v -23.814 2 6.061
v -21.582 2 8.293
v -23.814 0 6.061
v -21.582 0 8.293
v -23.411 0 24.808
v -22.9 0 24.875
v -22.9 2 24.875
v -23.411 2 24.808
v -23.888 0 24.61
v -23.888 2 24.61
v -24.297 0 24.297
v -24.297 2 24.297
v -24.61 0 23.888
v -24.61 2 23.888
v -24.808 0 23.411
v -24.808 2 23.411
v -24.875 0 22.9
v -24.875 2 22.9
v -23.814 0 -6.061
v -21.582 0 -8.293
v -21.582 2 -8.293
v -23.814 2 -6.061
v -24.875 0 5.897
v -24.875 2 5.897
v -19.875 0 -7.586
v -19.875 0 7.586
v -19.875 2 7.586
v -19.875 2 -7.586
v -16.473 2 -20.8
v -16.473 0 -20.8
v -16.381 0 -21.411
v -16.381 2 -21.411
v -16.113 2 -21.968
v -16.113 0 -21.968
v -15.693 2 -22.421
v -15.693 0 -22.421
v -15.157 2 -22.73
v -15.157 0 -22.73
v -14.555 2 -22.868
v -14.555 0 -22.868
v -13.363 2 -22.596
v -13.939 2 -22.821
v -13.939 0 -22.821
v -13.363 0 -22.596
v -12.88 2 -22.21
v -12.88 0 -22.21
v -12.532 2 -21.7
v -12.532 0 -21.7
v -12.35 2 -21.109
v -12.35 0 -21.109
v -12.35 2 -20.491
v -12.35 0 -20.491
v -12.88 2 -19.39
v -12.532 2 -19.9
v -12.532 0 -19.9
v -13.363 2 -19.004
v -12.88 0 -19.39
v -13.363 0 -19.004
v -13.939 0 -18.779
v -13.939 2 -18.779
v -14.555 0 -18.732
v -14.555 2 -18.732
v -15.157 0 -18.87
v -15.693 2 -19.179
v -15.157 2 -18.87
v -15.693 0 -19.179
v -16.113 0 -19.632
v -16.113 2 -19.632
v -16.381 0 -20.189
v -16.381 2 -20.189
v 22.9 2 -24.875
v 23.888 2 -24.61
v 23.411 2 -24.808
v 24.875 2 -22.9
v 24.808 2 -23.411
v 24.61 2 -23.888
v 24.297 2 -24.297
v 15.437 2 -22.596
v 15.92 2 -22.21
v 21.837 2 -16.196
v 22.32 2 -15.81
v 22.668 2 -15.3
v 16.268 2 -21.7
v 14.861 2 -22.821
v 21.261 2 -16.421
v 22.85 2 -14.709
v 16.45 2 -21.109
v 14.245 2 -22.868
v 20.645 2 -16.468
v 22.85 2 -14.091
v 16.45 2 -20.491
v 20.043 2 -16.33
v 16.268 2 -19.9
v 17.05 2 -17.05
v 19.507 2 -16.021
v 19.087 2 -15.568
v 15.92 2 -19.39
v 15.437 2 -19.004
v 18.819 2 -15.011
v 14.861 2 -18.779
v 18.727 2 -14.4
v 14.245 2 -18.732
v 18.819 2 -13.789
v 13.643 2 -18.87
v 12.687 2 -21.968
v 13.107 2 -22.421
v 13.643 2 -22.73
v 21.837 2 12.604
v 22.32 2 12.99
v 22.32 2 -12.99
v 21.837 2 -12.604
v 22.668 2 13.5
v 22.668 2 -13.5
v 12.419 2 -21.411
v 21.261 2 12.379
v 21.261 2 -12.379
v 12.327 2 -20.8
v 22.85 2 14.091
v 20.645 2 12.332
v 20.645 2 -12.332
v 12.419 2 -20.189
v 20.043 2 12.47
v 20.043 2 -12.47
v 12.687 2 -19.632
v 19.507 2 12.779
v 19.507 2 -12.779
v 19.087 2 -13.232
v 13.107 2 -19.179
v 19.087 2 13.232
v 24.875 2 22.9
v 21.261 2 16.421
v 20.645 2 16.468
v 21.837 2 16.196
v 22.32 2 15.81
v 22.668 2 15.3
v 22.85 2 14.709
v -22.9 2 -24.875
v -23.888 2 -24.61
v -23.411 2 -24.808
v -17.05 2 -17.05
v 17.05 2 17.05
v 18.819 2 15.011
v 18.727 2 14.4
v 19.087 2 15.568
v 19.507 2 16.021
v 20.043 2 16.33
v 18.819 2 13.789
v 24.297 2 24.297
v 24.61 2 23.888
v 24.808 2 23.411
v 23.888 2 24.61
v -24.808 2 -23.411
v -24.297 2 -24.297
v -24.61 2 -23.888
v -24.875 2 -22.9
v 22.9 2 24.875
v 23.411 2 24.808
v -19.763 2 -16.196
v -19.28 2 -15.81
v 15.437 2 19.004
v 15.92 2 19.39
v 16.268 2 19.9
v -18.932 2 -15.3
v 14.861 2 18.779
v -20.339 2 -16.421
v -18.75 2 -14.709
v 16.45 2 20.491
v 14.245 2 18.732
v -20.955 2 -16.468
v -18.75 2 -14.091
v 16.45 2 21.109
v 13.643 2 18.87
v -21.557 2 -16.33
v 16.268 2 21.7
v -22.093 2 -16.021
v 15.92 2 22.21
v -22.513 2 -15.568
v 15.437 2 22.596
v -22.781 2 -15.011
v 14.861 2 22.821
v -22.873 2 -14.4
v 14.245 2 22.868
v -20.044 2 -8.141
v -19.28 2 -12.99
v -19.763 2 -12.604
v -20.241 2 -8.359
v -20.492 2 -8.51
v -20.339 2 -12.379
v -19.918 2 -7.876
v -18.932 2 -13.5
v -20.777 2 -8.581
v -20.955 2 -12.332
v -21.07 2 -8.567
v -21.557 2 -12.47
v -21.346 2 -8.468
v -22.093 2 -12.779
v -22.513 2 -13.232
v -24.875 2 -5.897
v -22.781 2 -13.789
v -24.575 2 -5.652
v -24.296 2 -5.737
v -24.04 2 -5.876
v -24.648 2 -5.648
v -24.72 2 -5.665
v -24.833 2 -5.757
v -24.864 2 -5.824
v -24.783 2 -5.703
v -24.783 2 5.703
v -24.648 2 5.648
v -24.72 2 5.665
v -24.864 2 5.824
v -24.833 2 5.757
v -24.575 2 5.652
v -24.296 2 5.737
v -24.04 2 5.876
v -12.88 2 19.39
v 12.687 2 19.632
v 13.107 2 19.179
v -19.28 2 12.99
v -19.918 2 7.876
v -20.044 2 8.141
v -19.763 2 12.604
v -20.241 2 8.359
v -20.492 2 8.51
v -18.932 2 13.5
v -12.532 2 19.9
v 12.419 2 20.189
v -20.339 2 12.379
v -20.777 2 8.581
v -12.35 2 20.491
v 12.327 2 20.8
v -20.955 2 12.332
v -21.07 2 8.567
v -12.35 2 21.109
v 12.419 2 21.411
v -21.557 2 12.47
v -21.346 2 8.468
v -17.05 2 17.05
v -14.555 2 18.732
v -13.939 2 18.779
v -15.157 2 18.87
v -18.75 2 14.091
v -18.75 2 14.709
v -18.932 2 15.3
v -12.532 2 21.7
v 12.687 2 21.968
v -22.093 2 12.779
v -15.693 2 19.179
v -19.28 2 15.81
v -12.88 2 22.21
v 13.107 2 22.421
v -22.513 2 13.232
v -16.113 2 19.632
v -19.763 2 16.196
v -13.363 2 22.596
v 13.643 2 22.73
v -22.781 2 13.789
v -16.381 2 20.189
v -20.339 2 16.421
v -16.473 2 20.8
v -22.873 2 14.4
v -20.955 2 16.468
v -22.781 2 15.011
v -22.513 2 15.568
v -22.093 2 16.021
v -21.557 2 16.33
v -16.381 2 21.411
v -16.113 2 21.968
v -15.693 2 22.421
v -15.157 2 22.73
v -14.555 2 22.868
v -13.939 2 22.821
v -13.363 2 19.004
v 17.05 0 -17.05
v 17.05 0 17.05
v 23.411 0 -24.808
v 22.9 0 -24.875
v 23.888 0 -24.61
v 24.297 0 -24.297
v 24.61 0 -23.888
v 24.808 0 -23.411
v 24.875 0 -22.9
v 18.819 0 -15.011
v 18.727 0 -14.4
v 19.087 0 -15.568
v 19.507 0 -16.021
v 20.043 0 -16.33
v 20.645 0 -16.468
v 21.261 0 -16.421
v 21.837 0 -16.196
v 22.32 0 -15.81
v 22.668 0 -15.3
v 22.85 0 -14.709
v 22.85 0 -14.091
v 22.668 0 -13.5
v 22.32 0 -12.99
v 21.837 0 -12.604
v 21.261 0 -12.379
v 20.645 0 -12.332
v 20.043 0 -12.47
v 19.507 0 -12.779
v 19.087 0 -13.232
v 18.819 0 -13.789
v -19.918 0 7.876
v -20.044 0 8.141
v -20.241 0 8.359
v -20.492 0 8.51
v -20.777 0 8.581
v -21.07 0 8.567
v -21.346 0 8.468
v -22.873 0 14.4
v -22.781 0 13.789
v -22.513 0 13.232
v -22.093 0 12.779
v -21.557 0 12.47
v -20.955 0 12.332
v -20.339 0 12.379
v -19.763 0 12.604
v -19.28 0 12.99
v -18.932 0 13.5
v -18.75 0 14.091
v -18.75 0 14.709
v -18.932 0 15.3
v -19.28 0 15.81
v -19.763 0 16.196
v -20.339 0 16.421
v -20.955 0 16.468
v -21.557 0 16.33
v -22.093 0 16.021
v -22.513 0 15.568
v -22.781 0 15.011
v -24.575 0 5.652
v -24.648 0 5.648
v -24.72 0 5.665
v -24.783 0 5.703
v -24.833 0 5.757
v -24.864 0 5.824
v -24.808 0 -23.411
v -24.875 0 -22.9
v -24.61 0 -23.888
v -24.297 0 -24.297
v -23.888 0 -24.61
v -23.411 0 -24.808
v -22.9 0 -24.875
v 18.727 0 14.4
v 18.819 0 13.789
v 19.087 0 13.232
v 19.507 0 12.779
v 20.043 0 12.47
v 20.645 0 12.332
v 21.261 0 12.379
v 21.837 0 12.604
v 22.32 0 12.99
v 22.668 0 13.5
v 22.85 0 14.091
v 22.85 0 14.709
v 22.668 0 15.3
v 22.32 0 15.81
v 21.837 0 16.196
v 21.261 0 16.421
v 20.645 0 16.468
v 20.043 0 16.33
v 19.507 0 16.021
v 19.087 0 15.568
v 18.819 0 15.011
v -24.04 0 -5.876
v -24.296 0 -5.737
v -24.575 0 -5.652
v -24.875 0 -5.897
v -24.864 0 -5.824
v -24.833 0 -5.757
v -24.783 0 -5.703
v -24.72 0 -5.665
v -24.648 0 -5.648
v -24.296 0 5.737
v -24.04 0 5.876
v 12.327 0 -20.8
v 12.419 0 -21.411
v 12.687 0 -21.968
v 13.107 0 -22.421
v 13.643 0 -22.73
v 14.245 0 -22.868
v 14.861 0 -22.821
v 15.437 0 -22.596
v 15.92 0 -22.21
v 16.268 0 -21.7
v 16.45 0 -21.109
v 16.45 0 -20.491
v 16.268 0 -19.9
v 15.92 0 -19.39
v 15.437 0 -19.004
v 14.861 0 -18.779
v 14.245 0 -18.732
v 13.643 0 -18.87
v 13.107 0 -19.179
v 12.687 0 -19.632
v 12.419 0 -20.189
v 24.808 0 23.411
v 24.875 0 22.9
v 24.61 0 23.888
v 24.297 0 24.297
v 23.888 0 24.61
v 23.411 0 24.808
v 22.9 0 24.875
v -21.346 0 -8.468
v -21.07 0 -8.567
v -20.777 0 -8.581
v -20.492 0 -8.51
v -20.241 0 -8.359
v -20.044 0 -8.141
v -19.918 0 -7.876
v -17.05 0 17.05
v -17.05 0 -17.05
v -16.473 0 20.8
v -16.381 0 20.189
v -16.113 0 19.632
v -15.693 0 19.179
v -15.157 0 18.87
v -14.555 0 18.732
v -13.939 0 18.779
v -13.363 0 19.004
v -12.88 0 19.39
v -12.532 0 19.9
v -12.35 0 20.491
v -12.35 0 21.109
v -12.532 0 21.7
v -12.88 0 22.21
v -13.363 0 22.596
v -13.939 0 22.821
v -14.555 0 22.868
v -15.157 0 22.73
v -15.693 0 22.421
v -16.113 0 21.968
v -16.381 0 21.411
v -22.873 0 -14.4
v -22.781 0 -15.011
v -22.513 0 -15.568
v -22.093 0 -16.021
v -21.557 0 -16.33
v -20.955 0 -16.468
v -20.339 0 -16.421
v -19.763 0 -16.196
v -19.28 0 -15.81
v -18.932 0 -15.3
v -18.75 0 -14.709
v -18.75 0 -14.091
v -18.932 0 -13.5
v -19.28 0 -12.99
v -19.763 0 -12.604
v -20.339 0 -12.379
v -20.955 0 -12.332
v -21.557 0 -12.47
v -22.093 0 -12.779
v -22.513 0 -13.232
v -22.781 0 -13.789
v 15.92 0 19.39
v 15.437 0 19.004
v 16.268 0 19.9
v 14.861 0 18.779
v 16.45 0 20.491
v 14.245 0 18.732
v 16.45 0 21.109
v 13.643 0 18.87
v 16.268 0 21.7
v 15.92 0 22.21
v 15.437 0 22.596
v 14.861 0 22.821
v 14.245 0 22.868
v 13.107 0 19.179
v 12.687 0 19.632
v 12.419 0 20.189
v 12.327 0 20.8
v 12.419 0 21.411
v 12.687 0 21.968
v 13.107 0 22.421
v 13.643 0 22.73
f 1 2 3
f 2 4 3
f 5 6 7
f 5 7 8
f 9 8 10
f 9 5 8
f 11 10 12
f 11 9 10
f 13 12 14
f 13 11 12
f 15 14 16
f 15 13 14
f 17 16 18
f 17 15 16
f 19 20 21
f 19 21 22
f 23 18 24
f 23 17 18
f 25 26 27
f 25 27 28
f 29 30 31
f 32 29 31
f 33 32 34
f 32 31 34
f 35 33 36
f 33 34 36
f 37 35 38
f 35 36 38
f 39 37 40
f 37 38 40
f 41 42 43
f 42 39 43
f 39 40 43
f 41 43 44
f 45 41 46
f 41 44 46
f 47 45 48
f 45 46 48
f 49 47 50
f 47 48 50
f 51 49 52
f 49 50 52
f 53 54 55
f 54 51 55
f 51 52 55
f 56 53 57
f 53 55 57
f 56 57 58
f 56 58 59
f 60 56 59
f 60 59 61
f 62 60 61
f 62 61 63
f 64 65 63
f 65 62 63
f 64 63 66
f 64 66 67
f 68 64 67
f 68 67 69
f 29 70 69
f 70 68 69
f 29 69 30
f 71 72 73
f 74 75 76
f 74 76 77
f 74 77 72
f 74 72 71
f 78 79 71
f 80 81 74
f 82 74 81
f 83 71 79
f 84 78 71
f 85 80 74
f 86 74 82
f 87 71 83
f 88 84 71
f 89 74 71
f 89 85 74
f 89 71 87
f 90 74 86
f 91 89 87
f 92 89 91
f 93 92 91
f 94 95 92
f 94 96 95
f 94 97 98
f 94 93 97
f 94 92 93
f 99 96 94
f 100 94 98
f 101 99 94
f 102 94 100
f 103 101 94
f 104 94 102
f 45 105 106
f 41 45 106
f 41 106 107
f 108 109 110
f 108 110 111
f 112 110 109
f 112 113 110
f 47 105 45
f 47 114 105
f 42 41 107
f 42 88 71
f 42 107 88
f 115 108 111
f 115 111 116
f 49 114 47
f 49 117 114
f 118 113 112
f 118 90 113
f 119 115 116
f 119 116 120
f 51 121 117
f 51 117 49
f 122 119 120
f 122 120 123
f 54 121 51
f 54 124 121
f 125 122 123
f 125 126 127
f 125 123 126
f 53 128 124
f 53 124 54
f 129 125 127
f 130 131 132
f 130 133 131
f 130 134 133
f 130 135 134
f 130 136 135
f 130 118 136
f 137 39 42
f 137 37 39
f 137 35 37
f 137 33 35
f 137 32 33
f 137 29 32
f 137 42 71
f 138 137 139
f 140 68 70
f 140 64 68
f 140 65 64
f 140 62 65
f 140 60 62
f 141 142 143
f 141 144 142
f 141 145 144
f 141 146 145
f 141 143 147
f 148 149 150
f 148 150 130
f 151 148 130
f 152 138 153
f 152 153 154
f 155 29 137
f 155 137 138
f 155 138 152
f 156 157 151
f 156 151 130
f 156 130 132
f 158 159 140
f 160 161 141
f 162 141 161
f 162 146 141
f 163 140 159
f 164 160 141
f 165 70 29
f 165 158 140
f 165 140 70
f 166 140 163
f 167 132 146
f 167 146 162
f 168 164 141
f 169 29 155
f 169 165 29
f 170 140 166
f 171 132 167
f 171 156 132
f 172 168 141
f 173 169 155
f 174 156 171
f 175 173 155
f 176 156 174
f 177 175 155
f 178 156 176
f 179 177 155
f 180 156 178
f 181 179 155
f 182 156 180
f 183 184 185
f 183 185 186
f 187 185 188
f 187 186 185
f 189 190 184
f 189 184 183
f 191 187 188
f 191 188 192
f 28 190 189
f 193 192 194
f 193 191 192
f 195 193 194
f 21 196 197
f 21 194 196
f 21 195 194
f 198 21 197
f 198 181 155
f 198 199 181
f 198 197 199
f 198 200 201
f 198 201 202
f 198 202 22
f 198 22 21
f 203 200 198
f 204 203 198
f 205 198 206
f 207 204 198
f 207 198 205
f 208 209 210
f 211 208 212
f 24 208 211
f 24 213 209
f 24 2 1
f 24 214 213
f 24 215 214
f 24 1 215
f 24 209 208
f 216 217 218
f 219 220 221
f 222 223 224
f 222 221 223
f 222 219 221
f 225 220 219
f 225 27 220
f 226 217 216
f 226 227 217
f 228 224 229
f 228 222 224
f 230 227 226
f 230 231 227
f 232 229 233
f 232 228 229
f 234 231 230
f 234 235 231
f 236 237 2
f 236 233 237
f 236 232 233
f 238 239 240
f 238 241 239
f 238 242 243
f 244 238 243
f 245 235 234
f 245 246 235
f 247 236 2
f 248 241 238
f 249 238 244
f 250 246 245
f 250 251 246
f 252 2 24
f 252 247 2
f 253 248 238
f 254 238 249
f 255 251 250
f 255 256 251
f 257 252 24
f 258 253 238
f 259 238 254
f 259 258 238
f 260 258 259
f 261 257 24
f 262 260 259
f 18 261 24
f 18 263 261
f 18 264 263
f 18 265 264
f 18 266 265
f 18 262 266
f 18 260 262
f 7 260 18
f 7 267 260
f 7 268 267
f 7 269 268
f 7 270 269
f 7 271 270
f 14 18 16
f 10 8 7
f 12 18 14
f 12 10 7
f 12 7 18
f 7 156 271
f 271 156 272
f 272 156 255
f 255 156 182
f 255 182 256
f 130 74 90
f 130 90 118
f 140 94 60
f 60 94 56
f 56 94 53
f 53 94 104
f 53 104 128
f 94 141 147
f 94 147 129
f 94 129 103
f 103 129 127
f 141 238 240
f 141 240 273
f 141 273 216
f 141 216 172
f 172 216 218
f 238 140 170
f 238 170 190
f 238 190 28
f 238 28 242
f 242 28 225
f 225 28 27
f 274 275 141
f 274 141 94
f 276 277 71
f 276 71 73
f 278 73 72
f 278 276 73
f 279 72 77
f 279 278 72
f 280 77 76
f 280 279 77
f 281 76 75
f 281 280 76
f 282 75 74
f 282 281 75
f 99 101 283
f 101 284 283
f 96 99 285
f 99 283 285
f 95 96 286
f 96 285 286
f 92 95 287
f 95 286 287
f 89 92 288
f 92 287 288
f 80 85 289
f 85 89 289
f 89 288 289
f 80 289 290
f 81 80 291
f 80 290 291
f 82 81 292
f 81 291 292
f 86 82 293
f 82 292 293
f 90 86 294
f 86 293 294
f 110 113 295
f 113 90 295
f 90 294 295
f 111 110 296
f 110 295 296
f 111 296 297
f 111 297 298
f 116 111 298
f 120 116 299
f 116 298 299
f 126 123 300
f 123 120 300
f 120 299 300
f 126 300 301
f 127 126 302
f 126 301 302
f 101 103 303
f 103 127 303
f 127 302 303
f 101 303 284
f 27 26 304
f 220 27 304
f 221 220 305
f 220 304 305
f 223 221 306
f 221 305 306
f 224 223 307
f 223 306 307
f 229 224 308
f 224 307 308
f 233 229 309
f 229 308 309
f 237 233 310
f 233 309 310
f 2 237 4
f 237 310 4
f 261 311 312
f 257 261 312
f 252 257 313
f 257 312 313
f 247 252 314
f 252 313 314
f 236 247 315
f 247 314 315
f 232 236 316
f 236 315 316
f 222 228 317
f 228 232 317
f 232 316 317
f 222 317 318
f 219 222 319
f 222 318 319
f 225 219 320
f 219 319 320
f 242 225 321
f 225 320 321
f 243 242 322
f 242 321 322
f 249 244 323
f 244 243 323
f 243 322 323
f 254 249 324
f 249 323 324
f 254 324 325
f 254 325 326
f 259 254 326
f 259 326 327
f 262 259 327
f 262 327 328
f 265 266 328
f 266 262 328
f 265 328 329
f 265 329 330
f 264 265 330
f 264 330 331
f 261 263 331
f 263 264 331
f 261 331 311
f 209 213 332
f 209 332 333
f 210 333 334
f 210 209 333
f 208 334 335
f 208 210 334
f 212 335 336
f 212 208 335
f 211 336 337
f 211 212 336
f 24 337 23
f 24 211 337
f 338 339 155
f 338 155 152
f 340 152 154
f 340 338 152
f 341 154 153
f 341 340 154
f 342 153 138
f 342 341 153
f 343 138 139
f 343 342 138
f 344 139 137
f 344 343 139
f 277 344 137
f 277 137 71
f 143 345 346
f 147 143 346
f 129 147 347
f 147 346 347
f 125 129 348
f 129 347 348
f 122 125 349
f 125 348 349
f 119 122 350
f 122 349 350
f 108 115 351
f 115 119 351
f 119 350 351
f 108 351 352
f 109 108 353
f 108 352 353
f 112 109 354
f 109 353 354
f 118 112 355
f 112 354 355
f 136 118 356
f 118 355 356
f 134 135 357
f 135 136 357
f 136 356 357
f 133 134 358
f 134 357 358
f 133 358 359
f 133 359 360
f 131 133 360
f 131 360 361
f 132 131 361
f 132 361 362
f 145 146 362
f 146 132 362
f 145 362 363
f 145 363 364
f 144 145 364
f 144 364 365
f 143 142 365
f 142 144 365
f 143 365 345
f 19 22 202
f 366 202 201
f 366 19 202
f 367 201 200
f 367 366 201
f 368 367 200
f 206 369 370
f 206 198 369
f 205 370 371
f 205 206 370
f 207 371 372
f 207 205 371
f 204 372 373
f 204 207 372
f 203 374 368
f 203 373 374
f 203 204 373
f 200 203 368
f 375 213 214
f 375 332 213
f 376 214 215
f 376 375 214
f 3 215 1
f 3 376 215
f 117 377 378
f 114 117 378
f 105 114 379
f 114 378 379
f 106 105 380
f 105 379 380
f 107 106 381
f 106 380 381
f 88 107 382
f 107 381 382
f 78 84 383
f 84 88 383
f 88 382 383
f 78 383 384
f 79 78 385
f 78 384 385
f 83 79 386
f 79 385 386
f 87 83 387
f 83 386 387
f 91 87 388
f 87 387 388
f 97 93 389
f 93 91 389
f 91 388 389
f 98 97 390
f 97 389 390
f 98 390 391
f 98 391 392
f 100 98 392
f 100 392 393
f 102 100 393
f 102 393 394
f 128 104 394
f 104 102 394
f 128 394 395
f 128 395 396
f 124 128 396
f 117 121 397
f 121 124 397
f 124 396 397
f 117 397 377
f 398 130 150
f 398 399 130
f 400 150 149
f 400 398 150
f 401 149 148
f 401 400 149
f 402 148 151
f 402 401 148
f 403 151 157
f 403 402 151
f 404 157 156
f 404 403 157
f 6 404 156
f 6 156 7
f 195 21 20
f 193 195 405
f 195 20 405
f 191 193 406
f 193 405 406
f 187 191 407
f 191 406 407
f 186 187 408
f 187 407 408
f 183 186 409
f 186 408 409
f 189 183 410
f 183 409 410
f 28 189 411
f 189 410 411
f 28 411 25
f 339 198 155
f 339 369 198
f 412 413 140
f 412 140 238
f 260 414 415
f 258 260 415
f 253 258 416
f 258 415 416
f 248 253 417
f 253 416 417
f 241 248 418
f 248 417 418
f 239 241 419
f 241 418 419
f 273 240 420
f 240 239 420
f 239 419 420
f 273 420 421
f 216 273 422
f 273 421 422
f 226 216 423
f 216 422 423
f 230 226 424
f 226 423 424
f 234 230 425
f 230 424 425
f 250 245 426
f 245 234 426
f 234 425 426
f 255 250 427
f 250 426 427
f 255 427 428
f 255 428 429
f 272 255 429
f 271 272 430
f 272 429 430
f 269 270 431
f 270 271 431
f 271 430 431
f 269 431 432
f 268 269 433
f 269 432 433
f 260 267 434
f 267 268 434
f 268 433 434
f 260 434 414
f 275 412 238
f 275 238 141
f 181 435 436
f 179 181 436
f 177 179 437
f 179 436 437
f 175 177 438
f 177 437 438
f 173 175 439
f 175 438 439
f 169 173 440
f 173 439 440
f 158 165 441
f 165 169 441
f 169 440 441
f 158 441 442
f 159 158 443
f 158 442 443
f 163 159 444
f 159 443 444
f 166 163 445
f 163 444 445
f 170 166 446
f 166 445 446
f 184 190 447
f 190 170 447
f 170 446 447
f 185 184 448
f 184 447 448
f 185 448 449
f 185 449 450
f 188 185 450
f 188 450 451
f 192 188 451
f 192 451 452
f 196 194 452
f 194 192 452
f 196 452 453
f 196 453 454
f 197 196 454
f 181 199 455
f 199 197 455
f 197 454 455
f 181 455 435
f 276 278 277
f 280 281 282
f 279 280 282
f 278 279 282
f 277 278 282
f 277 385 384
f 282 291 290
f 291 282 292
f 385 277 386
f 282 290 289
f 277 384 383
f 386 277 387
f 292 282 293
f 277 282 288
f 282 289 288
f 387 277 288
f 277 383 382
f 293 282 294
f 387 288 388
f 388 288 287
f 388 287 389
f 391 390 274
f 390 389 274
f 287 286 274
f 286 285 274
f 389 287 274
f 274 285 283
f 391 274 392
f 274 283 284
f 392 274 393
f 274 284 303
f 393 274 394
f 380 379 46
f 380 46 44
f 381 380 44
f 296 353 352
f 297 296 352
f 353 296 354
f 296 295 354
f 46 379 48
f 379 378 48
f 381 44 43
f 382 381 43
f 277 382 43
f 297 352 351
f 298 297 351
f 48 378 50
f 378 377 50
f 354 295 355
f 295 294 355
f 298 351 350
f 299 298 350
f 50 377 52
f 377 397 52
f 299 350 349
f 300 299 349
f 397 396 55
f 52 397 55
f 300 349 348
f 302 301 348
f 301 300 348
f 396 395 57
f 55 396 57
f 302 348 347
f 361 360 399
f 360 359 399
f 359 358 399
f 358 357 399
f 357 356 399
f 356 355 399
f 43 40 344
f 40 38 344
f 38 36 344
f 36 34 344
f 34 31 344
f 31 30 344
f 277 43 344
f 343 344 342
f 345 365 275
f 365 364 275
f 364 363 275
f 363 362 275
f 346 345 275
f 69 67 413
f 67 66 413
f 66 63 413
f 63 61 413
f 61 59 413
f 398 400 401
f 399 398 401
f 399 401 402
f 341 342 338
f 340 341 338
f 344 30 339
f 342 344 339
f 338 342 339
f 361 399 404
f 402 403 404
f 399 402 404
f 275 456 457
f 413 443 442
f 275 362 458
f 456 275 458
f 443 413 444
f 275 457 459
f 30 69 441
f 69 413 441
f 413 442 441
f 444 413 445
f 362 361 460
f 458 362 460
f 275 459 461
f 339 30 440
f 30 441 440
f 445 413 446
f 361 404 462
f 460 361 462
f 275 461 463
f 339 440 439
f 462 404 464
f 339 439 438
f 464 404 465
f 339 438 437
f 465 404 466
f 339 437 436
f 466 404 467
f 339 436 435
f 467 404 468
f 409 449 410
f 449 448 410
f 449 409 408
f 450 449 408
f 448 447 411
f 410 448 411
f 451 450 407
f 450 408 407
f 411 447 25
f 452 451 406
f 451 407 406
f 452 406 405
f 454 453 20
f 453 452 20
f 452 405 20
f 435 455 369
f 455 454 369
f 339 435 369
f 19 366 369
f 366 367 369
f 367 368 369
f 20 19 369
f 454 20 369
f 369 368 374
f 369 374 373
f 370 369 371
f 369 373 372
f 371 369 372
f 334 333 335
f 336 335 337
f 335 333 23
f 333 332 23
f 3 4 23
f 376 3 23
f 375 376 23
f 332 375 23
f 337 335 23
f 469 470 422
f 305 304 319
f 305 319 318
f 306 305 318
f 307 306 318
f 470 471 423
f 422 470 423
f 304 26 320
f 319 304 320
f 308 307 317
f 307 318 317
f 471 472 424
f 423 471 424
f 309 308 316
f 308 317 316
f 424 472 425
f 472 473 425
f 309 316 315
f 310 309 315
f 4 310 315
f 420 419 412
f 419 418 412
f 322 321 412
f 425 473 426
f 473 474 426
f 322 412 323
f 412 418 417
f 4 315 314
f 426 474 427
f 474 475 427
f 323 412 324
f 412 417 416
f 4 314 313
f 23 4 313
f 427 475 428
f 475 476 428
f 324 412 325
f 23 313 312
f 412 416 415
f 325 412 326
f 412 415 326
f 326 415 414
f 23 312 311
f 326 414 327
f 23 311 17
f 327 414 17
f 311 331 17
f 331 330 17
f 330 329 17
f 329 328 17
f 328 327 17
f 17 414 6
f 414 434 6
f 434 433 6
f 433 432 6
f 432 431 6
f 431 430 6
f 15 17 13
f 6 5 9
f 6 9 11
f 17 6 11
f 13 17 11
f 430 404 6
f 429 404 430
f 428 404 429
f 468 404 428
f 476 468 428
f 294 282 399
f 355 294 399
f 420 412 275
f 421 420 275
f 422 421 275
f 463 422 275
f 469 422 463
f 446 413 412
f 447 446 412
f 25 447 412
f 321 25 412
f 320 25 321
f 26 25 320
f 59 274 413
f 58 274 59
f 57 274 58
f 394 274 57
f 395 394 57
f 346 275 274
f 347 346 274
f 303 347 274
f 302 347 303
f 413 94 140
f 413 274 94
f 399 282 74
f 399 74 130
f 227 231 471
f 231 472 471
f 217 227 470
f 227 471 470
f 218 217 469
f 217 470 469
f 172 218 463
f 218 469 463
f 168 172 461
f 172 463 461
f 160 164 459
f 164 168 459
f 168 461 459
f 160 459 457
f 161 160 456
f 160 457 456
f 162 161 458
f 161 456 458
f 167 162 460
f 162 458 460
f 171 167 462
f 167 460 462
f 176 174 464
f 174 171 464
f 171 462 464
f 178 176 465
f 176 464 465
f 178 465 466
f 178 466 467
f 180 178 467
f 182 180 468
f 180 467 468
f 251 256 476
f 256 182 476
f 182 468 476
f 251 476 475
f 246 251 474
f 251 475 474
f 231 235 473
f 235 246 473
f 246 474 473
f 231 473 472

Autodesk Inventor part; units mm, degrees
ref_plane "YZ Plane" through (0, 0, 0) normal (1, 0, 0) x (0, 1, 0)
ref_plane "XZ Plane" through (0, 0, 0) normal (0, 1, 0) x (-1, 0, 0)
ref_plane "XY Plane" through (0, 0, 0) normal (0, 0, 1) x (1, 0, 0)
sketch "Sketch1" plane through (0, 0, 0) normal (0, 1, 0) x (-1, 0, 0)
  circle A0 centre (-21.9, -21.9) radius 1.875 projected
  circle A1 centre (21.9, 21.9) radius 1.875 projected
  circle A2 centre (21.9, -21.9) radius 1.875 projected
  circle A3 centre (-21.9, 21.9) radius 1.875 projected
  circle A4 centre (14.4, 20.8) radius 2.0734 projected
  circle A5 centre (-14.4, -20.8) radius 2.0734 projected
  circle A6 centre (14.4, -20.8) radius 2.0734 projected
  circle A7 centre (20.8, -14.4) radius 2.0734 projected
  line L0 (-17.05, 17.05) -> (-17.05, -17.05) projected
  line L1 (17.05, 17.05) -> (-17.05, 17.05) projected
  line L2 (17.05, -17.05) -> (17.05, 17.05) projected
  line L3 (-17.05, -17.05) -> (17.05, -17.05) projected
  circle A8 centre (20.8, 14.4) radius 2.0734 projected
  circle A9 centre (-14.4, 20.8) radius 2.0734 projected
  circle A10 centre (-20.8, -14.4) radius 2.0734 projected
  circle A11 centre (-20.8, 14.4) radius 2.0734 projected
  line L4 (-22.9, 24.875) -> (22.9, 24.875) projected
  arc A12 (-22.9, 24.875) -> (-24.875, 22.9) centre (-22.9, 22.9) ccw projected
  line L5 (-24.875, -22.9) -> (-24.875, 22.9) projected
  arc A13 (-24.875, -22.9) -> (-22.9, -24.875) centre (-22.9, -22.9) ccw projected
  line L6 (22.9, -24.875) -> (-22.9, -24.875) projected
  arc A14 (22.9, -24.875) -> (24.875, -22.9) centre (22.9, -22.9) ccw projected
  line L7 (24.875, 22.9) -> (24.875, -22.9) projected
  arc A15 (24.875, 22.9) -> (22.9, 24.875) centre (22.9, 22.9) ccw projected
  arc A16 (24.9, 22.9) -> (22.9, 24.9) centre (22.9, 22.9) ccw projected
  line L8 (22.9, 24.9) -> (-22.9, 24.9) projected
  arc A17 (-22.9, 24.9) -> (-24.9, 22.9) centre (-22.9, 22.9) ccw projected
  line L9 (-24.9, 22.9) -> (-24.9, -22.9) projected
  arc A18 (-24.9, -22.9) -> (-22.9, -24.9) centre (-22.9, -22.9) ccw projected
  line L10 (-22.9, -24.9) -> (22.9, -24.9) projected
  arc A19 (22.9, -24.9) -> (24.9, -22.9) centre (22.9, -22.9) ccw projected
  line L11 (24.9, -22.9) -> (24.9, 22.9) projected
  point P0 (0, 0)
extrude "Extrusion1" add sketch "Sketch1" along normal blind 2 contours A0 | A1 | A2 | A3 | L4 A15 L7 A14 L6 A13 L5 A12
sketch "Sketch2" plane through (0, 0, 0) normal (0, 1, 0) x (-1, 0, 0)
  line L0 (-7.5858, -29.875) -> (7.5858, -29.875)
  line L1 (10, -29.875) -> (10, -19.875)
  line L2 (7.5858, -19.875) -> (-7.5858, -19.875)
  line L3 (-10, -19.875) -> (-10, -29.875)
  line L4 (-10, -29.875) -> (10, -19.875) construction
  line L5 (10, -29.875) -> (-10, -19.875) construction
  line L6 (-8.2929, -21.5821) -> (-6.0607, -23.8143)
  line L7 (-10, -19.875) -> (-6.8431, -19.875) construction
  line L8 (8.2929, -21.5821) -> (6.0607, -23.8143)
  line L9 (-8.2929, -28.1679) -> (-6.0607, -25.9357)
  line L10 (8.2929, -28.1679) -> (6.0607, -25.9357)
  arc A0 (-8.2929, -28.1679) -> (-7.5858, -29.875) centre (-7.5858, -28.875) ccw
  arc A1 (7.5858, -29.875) -> (8.2929, -28.1679) centre (7.5858, -28.875) ccw
  arc A2 (-6.0607, -25.9357) -> (-6.0607, -23.8143) centre (-7.1213, -24.875) ccw
  arc A3 (6.0607, -23.8143) -> (6.0607, -25.9357) centre (7.1213, -24.875) ccw
  arc A4 (-7.5858, -19.875) -> (-8.2929, -21.5821) centre (-7.5858, -20.875) ccw
  arc A5 (8.2929, -21.5821) -> (7.5858, -19.875) centre (7.5858, -20.875) ccw
  line L11 (-7.5858, -19.95) -> (7.5858, -19.95)
  arc A6 (8.2399, -21.5291) -> (7.5858, -19.95) centre (7.5858, -20.875) ccw
  line L12 (8.2399, -21.5291) -> (6.0076, -23.7613)
  arc A7 (6.0076, -23.7613) -> (6.0076, -25.9887) centre (7.1213, -24.875) ccw
  line L13 (6.0076, -25.9887) -> (8.2399, -28.2209)
  arc A8 (7.5858, -29.8) -> (8.2399, -28.2209) centre (7.5858, -28.875) ccw
  line L14 (7.5858, -29.8) -> (-7.5858, -29.8)
  arc A9 (-8.2399, -28.2209) -> (-7.5858, -29.8) centre (-7.5858, -28.875) ccw
  line L15 (-8.2399, -28.2209) -> (-6.0076, -25.9887)
  arc A10 (-6.0076, -25.9887) -> (-6.0076, -23.7613) centre (-7.1213, -24.875) ccw
  line L16 (-6.0076, -23.7613) -> (-8.2399, -21.5291)
  arc A11 (-7.5858, -19.95) -> (-8.2399, -21.5291) centre (-7.5858, -20.875) ccw
  line L17 (-8.2399, 21.7791) -> (-6.0076, 24.0113)
  line L18 (-7.5858, 30.05) -> (7.5858, 30.05)
  line L19 (7.5858, 20.2) -> (-7.5858, 20.2)
  line L20 (-7.5858, 20.125) -> (7.5858, 20.125)
  line L21 (7.5858, 30.125) -> (-7.5858, 30.125)
  line L22 (10, 20.125) -> (-10, 30.125) construction
  line L23 (-10, 20.125) -> (10, 30.125) construction
  arc A12 (-6.0076, 24.0113) -> (-6.0076, 26.2387) centre (-7.1213, 25.125) ccw
  arc A13 (-6.0607, 24.0643) -> (-6.0607, 26.1857) centre (-7.1213, 25.125) ccw
  arc A14 (-7.5858, 30.05) -> (-8.2399, 28.4709) centre (-7.5858, 29.125) ccw
  arc A15 (-7.5858, 30.125) -> (-8.2929, 28.4179) centre (-7.5858, 29.125) ccw
  line L24 (-8.2929, 28.4179) -> (-6.0607, 26.1857)
  line L25 (-10, 30.125) -> (-6.8431, 30.125) construction
  line L26 (-10, 30.125) -> (-10, 20.125)
  arc A16 (-8.2399, 21.7791) -> (-7.5858, 20.2) centre (-7.5858, 21.125) ccw
  arc A17 (-8.2929, 21.8321) -> (-7.5858, 20.125) centre (-7.5858, 21.125) ccw
  line L27 (-8.2929, 21.8321) -> (-6.0607, 24.0643)
  line L28 (-6.0076, 26.2387) -> (-8.2399, 28.4709)
  line L29 (10, 20.125) -> (10, 30.125)
  line L30 (8.2929, 28.4179) -> (6.0607, 26.1857)
  line L31 (8.2929, 21.8321) -> (6.0607, 24.0643)
  arc A18 (7.5858, 20.125) -> (8.2929, 21.8321) centre (7.5858, 21.125) ccw
  arc A19 (6.0076, 26.2387) -> (6.0076, 24.0113) centre (7.1213, 25.125) ccw
  arc A20 (6.0607, 26.1857) -> (6.0607, 24.0643) centre (7.1213, 25.125) ccw
  arc A21 (7.5858, 20.2) -> (8.2399, 21.7791) centre (7.5858, 21.125) ccw
  line L32 (6.0076, 24.0113) -> (8.2399, 21.7791)
  line L33 (8.2399, 28.4709) -> (6.0076, 26.2387)
  arc A22 (8.2929, 28.4179) -> (7.5858, 30.125) centre (7.5858, 29.125) ccw
  arc A23 (8.2399, 28.4709) -> (7.5858, 30.05) centre (7.5858, 29.125) ccw
  line L34 (0, 24.875) -> (0, 25.125)
  line L35 (-22.9, -24.875) -> (22.9, -24.875) projected
  line L36 (22.9, 24.875) -> (-22.9, 24.875) projected
  line L37 (0, -24.875) -> (0, -24.875)
  line L38 (5.6213, 25.125) -> (5.5463, 25.125)
  line L39 (5.5463, 25.125) -> (5.5463, 24.875)
  line L40 (5.5463, 24.875) -> (5.6213, 24.875)
  line L41 (5.6213, 24.875) -> (5.6213, 25.125)
  line L42 (-5.6213, 25.125) -> (-5.5463, 25.125)
  line L43 (-5.5463, 25.125) -> (-5.5463, 24.875)
  line L44 (-5.5463, 24.875) -> (-5.6213, 24.875)
  line L45 (-5.6213, 24.875) -> (-5.6213, 25.125)
  line L46 (-5.6213, -24.875) -> (-5.5463, -24.875)
  line L47 (-5.5463, -24.875) -> (-5.5463, -24.875)
  line L48 (-5.5463, -24.875) -> (-5.6213, -24.875)
  line L49 (-5.6213, -24.875) -> (-5.6213, -24.875)
  line L50 (5.6213, -24.875) -> (5.5463, -24.875)
  line L51 (5.5463, -24.875) -> (5.5463, -24.875)
  line L52 (5.5463, -24.875) -> (5.6213, -24.875)
  line L53 (5.6213, -24.875) -> (5.6213, -24.875)
  arc A24 (19.95, -7.5858) -> (21.5291, -8.2399) centre (20.875, -7.5858) ccw
  arc A25 (19.875, -7.5858) -> (21.5821, -8.2929) centre (20.875, -7.5858) ccw
  line L54 (21.5821, -8.2929) -> (23.8143, -6.0607)
  line L55 (23.7613, -6.0076) -> (21.5291, -8.2399)
  arc A26 (25.9357, -6.0607) -> (23.8143, -6.0607) centre (24.875, -7.1213) ccw
  arc A27 (25.9887, -6.0076) -> (23.7613, -6.0076) centre (24.875, -7.1213) ccw
  line L56 (29.875, -7.5858) -> (29.875, 7.5858)
  line L57 (29.8, 7.5858) -> (29.8, -7.5858)
  line L58 (19.95, -7.5858) -> (19.95, 7.5858)
  line L59 (19.875, 7.5858) -> (19.875, -7.5858)
  line L60 (28.2209, -8.2399) -> (25.9887, -6.0076)
  line L61 (21.5821, 8.2929) -> (23.8143, 6.0607)
  line L62 (28.1679, 8.2929) -> (25.9357, 6.0607)
  arc A28 (29.875, 7.5858) -> (28.1679, 8.2929) centre (28.875, 7.5858) ccw
  arc A29 (23.7613, 6.0076) -> (25.9887, 6.0076) centre (24.875, 7.1213) ccw
  line L63 (24.875, 5.5463) -> (24.875, 5.5463)
  line L64 (24.875, 5.6213) -> (24.875, 5.5463)
  line L65 (24.875, 5.5463) -> (24.875, 5.6213)
  line L66 (24.875, 5.6213) -> (24.875, 5.6213)
  arc A30 (23.8143, 6.0607) -> (25.9357, 6.0607) centre (24.875, 7.1213) ccw
  line L67 (25.9887, 6.0076) -> (28.2209, 8.2399)
  arc A31 (29.8, 7.5858) -> (28.2209, 8.2399) centre (28.875, 7.5858) ccw
  line L68 (21.5291, 8.2399) -> (23.7613, 6.0076)
  arc A32 (21.5291, 8.2399) -> (19.95, 7.5858) centre (20.875, 7.5858) ccw
  arc A33 (21.5821, 8.2929) -> (19.875, 7.5858) centre (20.875, 7.5858) ccw
  line L69 (24.875, -5.5463) -> (24.875, -5.5463)
  line L70 (24.875, -5.5463) -> (24.875, -5.6213)
  line L71 (24.875, -5.6213) -> (24.875, -5.5463)
  line L72 (24.875, -5.6213) -> (24.875, -5.6213)
  line L73 (24.875, 0) -> (24.875, 0)
  line L74 (28.1679, -8.2929) -> (25.9357, -6.0607)
  arc A34 (28.1679, -8.2929) -> (29.875, -7.5858) centre (28.875, -7.5858) ccw
  arc A35 (28.2209, -8.2399) -> (29.8, -7.5858) centre (28.875, -7.5858) ccw
  line L75 (-25.125, 5.6213) -> (-25.125, 5.5463)
  arc A36 (-28.4709, 8.2399) -> (-30.05, 7.5858) centre (-29.125, 7.5858) ccw
  arc A37 (-28.4179, 8.2929) -> (-30.125, 7.5858) centre (-29.125, 7.5858) ccw
  line L76 (-28.4179, 8.2929) -> (-26.1857, 6.0607)
  line L77 (-24.875, 5.5463) -> (-24.875, 5.6213)
  arc A38 (-26.2387, 6.0076) -> (-24.0113, 6.0076) centre (-25.125, 7.1213) ccw
  line L78 (-21.8321, 8.2929) -> (-24.0643, 6.0607)
  line L79 (-24.875, 0) -> (-25.125, 0)
  arc A39 (-20.2, 7.5858) -> (-21.7791, 8.2399) centre (-21.125, 7.5858) ccw
  arc A40 (-20.125, 7.5858) -> (-21.8321, 8.2929) centre (-21.125, 7.5858) ccw
  line L80 (-30.05, -7.5858) -> (-30.05, 7.5858)
  line L81 (-30.125, 7.5858) -> (-30.125, -7.5858)
  line L82 (-20.2, 7.5858) -> (-20.2, -7.5858)
  line L83 (-20.125, -7.5858) -> (-20.125, 7.5858)
  line L84 (-24.875, 5.6213) -> (-25.125, 5.6213)
  arc A41 (-26.1857, 6.0607) -> (-24.0643, 6.0607) centre (-25.125, 7.1213) ccw
  line L85 (-24.0113, 6.0076) -> (-21.7791, 8.2399)
  line L86 (-25.125, 5.5463) -> (-24.875, 5.5463)
  line L87 (-28.4709, 8.2399) -> (-26.2387, 6.0076)
  line L88 (-25.125, -5.5463) -> (-24.875, -5.5463)
  line L89 (-24.875, -5.5463) -> (-24.875, -5.6213)
  line L90 (-24.875, -5.6213) -> (-25.125, -5.6213)
  line L91 (-25.125, -5.6213) -> (-25.125, -5.5463)
  arc A42 (-30.05, -7.5858) -> (-28.4709, -8.2399) centre (-29.125, -7.5858) ccw
  arc A43 (-21.8321, -8.2929) -> (-20.125, -7.5858) centre (-21.125, -7.5858) ccw
  arc A44 (-21.7791, -8.2399) -> (-20.2, -7.5858) centre (-21.125, -7.5858) ccw
  arc A45 (-24.0113, -6.0076) -> (-26.2387, -6.0076) centre (-25.125, -7.1213) ccw
  arc A46 (-24.0643, -6.0607) -> (-26.1857, -6.0607) centre (-25.125, -7.1213) ccw
  line L92 (-21.7791, -8.2399) -> (-24.0113, -6.0076)
  line L93 (-21.8321, -8.2929) -> (-24.0643, -6.0607)
  line L94 (-28.4179, -8.2929) -> (-26.1857, -6.0607)
  line L95 (-26.2387, -6.0076) -> (-28.4709, -8.2399)
  arc A47 (-30.125, -7.5858) -> (-28.4179, -8.2929) centre (-29.125, -7.5858) ccw
  arc A48 (7.5858, 19.95) -> (8.2399, 21.5291) centre (7.5858, 20.875) ccw
  arc A49 (7.5858, 19.875) -> (8.2929, 21.5821) centre (7.5858, 20.875) ccw
  line L96 (8.2929, 21.5821) -> (6.0607, 23.8143)
  line L97 (6.0076, 23.7613) -> (8.2399, 21.5291)
  arc A50 (6.0607, 25.9357) -> (6.0607, 23.8143) centre (7.1213, 24.875) ccw
  arc A51 (6.0076, 25.9887) -> (6.0076, 23.7613) centre (7.1213, 24.875) ccw
  line L98 (7.5858, 29.875) -> (-7.5858, 29.875)
  line L99 (-7.5858, 29.8) -> (7.5858, 29.8)
  line L100 (7.5858, 19.95) -> (-7.5858, 19.95)
  line L101 (-7.5858, 19.875) -> (7.5858, 19.875)
  line L102 (8.2399, 28.2209) -> (6.0076, 25.9887)
  line L103 (-8.2929, 21.5821) -> (-6.0607, 23.8143)
  line L104 (-8.2929, 28.1679) -> (-6.0607, 25.9357)
  arc A52 (-7.5858, 29.875) -> (-8.2929, 28.1679) centre (-7.5858, 28.875) ccw
  arc A53 (-6.0076, 23.7613) -> (-6.0076, 25.9887) centre (-7.1213, 24.875) ccw
  line L105 (-5.5463, 24.875) -> (-5.5463, 24.875)
  line L106 (-5.6213, 24.875) -> (-5.5463, 24.875)
  line L107 (-5.5463, 24.875) -> (-5.6213, 24.875)
  line L108 (-5.6213, 24.875) -> (-5.6213, 24.875)
  arc A54 (-6.0607, 23.8143) -> (-6.0607, 25.9357) centre (-7.1213, 24.875) ccw
  line L109 (-6.0076, 25.9887) -> (-8.2399, 28.2209)
  arc A55 (-7.5858, 29.8) -> (-8.2399, 28.2209) centre (-7.5858, 28.875) ccw
  line L110 (-8.2399, 21.5291) -> (-6.0076, 23.7613)
  arc A56 (-8.2399, 21.5291) -> (-7.5858, 19.95) centre (-7.5858, 20.875) ccw
  arc A57 (-8.2929, 21.5821) -> (-7.5858, 19.875) centre (-7.5858, 20.875) ccw
  line L111 (5.5463, 24.875) -> (5.5463, 24.875)
  line L112 (5.5463, 24.875) -> (5.6213, 24.875)
  line L113 (5.6213, 24.875) -> (5.5463, 24.875)
  line L114 (5.6213, 24.875) -> (5.6213, 24.875)
  line L115 (0, 24.875) -> (0, 24.875)
  line L116 (8.2929, 28.1679) -> (6.0607, 25.9357)
  arc A58 (8.2929, 28.1679) -> (7.5858, 29.875) centre (7.5858, 28.875) ccw
  arc A59 (8.2399, 28.2209) -> (7.5858, 29.8) centre (7.5858, 28.875) ccw
  line L117 (-5.6213, -25.125) -> (-5.5463, -25.125)
  arc A60 (-8.2399, -28.4709) -> (-7.5858, -30.05) centre (-7.5858, -29.125) ccw
  arc A61 (-8.2929, -28.4179) -> (-7.5858, -30.125) centre (-7.5858, -29.125) ccw
  line L118 (-8.2929, -28.4179) -> (-6.0607, -26.1857)
  line L119 (-5.5463, -24.875) -> (-5.6213, -24.875)
  arc A62 (-6.0076, -26.2387) -> (-6.0076, -24.0113) centre (-7.1213, -25.125) ccw
  line L120 (-8.2929, -21.8321) -> (-6.0607, -24.0643)
  line L121 (0, -24.875) -> (0, -25.125)
  arc A63 (-7.5858, -20.2) -> (-8.2399, -21.7791) centre (-7.5858, -21.125) ccw
  arc A64 (-7.5858, -20.125) -> (-8.2929, -21.8321) centre (-7.5858, -21.125) ccw
  line L122 (7.5858, -30.05) -> (-7.5858, -30.05)
  line L123 (-7.5858, -30.125) -> (7.5858, -30.125)
  line L124 (-7.5858, -20.2) -> (7.5858, -20.2)
  line L125 (7.5858, -20.125) -> (-7.5858, -20.125)
  line L126 (-5.6213, -24.875) -> (-5.6213, -25.125)
  arc A65 (-6.0607, -26.1857) -> (-6.0607, -24.0643) centre (-7.1213, -25.125) ccw
  line L127 (-6.0076, -24.0113) -> (-8.2399, -21.7791)
  line L128 (-5.5463, -25.125) -> (-5.5463, -24.875)
  line L129 (-8.2399, -28.4709) -> (-6.0076, -26.2387)
  line L130 (5.5463, -25.125) -> (5.5463, -24.875)
  line L131 (5.5463, -24.875) -> (5.6213, -24.875)
  line L132 (5.6213, -24.875) -> (5.6213, -25.125)
  line L133 (5.6213, -25.125) -> (5.5463, -25.125)
  arc A66 (7.5858, -30.05) -> (8.2399, -28.4709) centre (7.5858, -29.125) ccw
  arc A67 (8.2929, -21.8321) -> (7.5858, -20.125) centre (7.5858, -21.125) ccw
  arc A68 (8.2399, -21.7791) -> (7.5858, -20.2) centre (7.5858, -21.125) ccw
  arc A69 (6.0076, -24.0113) -> (6.0076, -26.2387) centre (7.1213, -25.125) ccw
  arc A70 (6.0607, -24.0643) -> (6.0607, -26.1857) centre (7.1213, -25.125) ccw
  line L134 (8.2399, -21.7791) -> (6.0076, -24.0113)
  line L135 (8.2929, -21.8321) -> (6.0607, -24.0643)
  line L136 (8.2929, -28.4179) -> (6.0607, -26.1857)
  line L137 (6.0076, -26.2387) -> (8.2399, -28.4709)
  arc A71 (7.5858, -30.125) -> (8.2929, -28.4179) centre (7.5858, -29.125) ccw
  arc A72 (-19.95, 7.5858) -> (-21.5291, 8.2399) centre (-20.875, 7.5858) ccw
  arc A73 (-19.875, 7.5858) -> (-21.5821, 8.2929) centre (-20.875, 7.5858) ccw
  line L138 (-21.5821, 8.2929) -> (-23.8143, 6.0607)
  line L139 (-23.7613, 6.0076) -> (-21.5291, 8.2399)
  arc A74 (-25.9357, 6.0607) -> (-23.8143, 6.0607) centre (-24.875, 7.1213) ccw
  arc A75 (-25.9887, 6.0076) -> (-23.7613, 6.0076) centre (-24.875, 7.1213) ccw
  line L140 (-29.875, 7.5858) -> (-29.875, -7.5858)
  line L141 (-29.8, -7.5858) -> (-29.8, 7.5858)
  line L142 (-19.95, 7.5858) -> (-19.95, -7.5858)
  line L143 (-19.875, -7.5858) -> (-19.875, 7.5858)
  line L144 (-28.2209, 8.2399) -> (-25.9887, 6.0076)
  line L145 (-21.5821, -8.2929) -> (-23.8143, -6.0607)
  line L146 (-28.1679, -8.2929) -> (-25.9357, -6.0607)
  arc A76 (-29.875, -7.5858) -> (-28.1679, -8.2929) centre (-28.875, -7.5858) ccw
  arc A77 (-23.7613, -6.0076) -> (-25.9887, -6.0076) centre (-24.875, -7.1213) ccw
  line L147 (-24.875, -5.5463) -> (-24.875, -5.5463)
  line L148 (-24.875, -5.6213) -> (-24.875, -5.5463)
  line L149 (-24.875, -5.5463) -> (-24.875, -5.6213)
  line L150 (-24.875, -5.6213) -> (-24.875, -5.6213)
  arc A78 (-23.8143, -6.0607) -> (-25.9357, -6.0607) centre (-24.875, -7.1213) ccw
  line L151 (-25.9887, -6.0076) -> (-28.2209, -8.2399)
  arc A79 (-29.8, -7.5858) -> (-28.2209, -8.2399) centre (-28.875, -7.5858) ccw
  line L152 (-21.5291, -8.2399) -> (-23.7613, -6.0076)
  arc A80 (-21.5291, -8.2399) -> (-19.95, -7.5858) centre (-20.875, -7.5858) ccw
  arc A81 (-21.5821, -8.2929) -> (-19.875, -7.5858) centre (-20.875, -7.5858) ccw
  line L153 (-24.875, 5.5463) -> (-24.875, 5.5463)
  line L154 (-24.875, 5.5463) -> (-24.875, 5.6213)
  line L155 (-24.875, 5.6213) -> (-24.875, 5.5463)
  line L156 (-24.875, 5.6213) -> (-24.875, 5.6213)
  line L157 (-24.875, 0) -> (-24.875, 0)
  line L158 (-28.1679, 8.2929) -> (-25.9357, 6.0607)
  arc A82 (-28.1679, 8.2929) -> (-29.875, 7.5858) centre (-28.875, 7.5858) ccw
  arc A83 (-28.2209, 8.2399) -> (-29.8, 7.5858) centre (-28.875, 7.5858) ccw
  line L159 (25.125, -5.6213) -> (25.125, -5.5463)
  arc A84 (28.4709, -8.2399) -> (30.05, -7.5858) centre (29.125, -7.5858) ccw
  arc A85 (28.4179, -8.2929) -> (30.125, -7.5858) centre (29.125, -7.5858) ccw
  line L160 (28.4179, -8.2929) -> (26.1857, -6.0607)
  line L161 (24.875, -5.5463) -> (24.875, -5.6213)
  arc A86 (26.2387, -6.0076) -> (24.0113, -6.0076) centre (25.125, -7.1213) ccw
  line L162 (21.8321, -8.2929) -> (24.0643, -6.0607)
  line L163 (24.875, 0) -> (25.125, 0)
  arc A87 (20.2, -7.5858) -> (21.7791, -8.2399) centre (21.125, -7.5858) ccw
  arc A88 (20.125, -7.5858) -> (21.8321, -8.2929) centre (21.125, -7.5858) ccw
  line L164 (30.05, 7.5858) -> (30.05, -7.5858)
  line L165 (30.125, -7.5858) -> (30.125, 7.5858)
  line L166 (20.2, -7.5858) -> (20.2, 7.5858)
  line L167 (20.125, 7.5858) -> (20.125, -7.5858)
  line L168 (24.875, -5.6213) -> (25.125, -5.6213)
  arc A89 (26.1857, -6.0607) -> (24.0643, -6.0607) centre (25.125, -7.1213) ccw
  line L169 (24.0113, -6.0076) -> (21.7791, -8.2399)
  line L170 (25.125, -5.5463) -> (24.875, -5.5463)
  line L171 (28.4709, -8.2399) -> (26.2387, -6.0076)
  line L172 (25.125, 5.5463) -> (24.875, 5.5463)
  line L173 (24.875, 5.5463) -> (24.875, 5.6213)
  line L174 (24.875, 5.6213) -> (25.125, 5.6213)
  line L175 (25.125, 5.6213) -> (25.125, 5.5463)
  arc A90 (30.05, 7.5858) -> (28.4709, 8.2399) centre (29.125, 7.5858) ccw
  arc A91 (21.8321, 8.2929) -> (20.125, 7.5858) centre (21.125, 7.5858) ccw
  arc A92 (21.7791, 8.2399) -> (20.2, 7.5858) centre (21.125, 7.5858) ccw
  arc A93 (24.0113, 6.0076) -> (26.2387, 6.0076) centre (25.125, 7.1213) ccw
  arc A94 (24.0643, 6.0607) -> (26.1857, 6.0607) centre (25.125, 7.1213) ccw
  line L176 (21.7791, 8.2399) -> (24.0113, 6.0076)
  line L177 (21.8321, 8.2929) -> (24.0643, 6.0607)
  line L178 (28.4179, 8.2929) -> (26.1857, 6.0607)
  line L179 (26.2387, 6.0076) -> (28.4709, 8.2399)
  arc A95 (30.125, 7.5858) -> (28.4179, 8.2929) centre (29.125, 7.5858) ccw
  line L180 (-22.9, -24.875) -> (22.9, -24.875) projected
  arc A96 (22.9, -24.875) -> (24.875, -22.9) centre (22.9, -22.9) ccw projected
  line L181 (24.875, -22.9) -> (24.875, 22.9) projected
  arc A97 (24.875, 22.9) -> (22.9, 24.875) centre (22.9, 22.9) ccw projected
  line L182 (22.9, 24.875) -> (-22.9, 24.875) projected
  arc A98 (-22.9, 24.875) -> (-24.875, 22.9) centre (-22.9, 22.9) ccw projected
  line L183 (-24.875, 22.9) -> (-24.875, -22.9) projected
  arc A99 (-24.875, -22.9) -> (-22.9, -24.875) centre (-22.9, -22.9) ccw projected
  circle A100 centre (-20.8, 14.4) radius 2.0734 projected
  circle A101 centre (-20.8, -14.4) radius 2.0734 projected
  circle A102 centre (-14.4, 20.8) radius 2.0734 projected
  circle A103 centre (20.8, 14.4) radius 2.0734 projected
  circle A104 centre (20.8, -14.4) radius 2.0734 projected
  circle A105 centre (14.4, -20.8) radius 2.0734 projected
  circle A106 centre (-14.4, -20.8) radius 2.0734 projected
  circle A107 centre (14.4, 20.8) radius 2.0734 projected
  line L184 (-17.05, 17.05) -> (17.05, 17.05) projected
  line L185 (17.05, 17.05) -> (17.05, -17.05) projected
  line L186 (17.05, -17.05) -> (-17.05, -17.05) projected
  line L187 (-17.05, -17.05) -> (-17.05, 17.05) projected
  point P0 (0, 0)
  point P1 (19.875, -6.8431)
  point P2 (19.875, -10)
  point P3 (29.875, -10)
  point P4 (29.875, 10)
  point P5 (19.875, 10)
  point P6 (-30.125, 10)
  point P7 (-20.125, 10)
  point P8 (-30.125, -10)
  point P9 (-20.125, -10)
  point P10 (-30.125, -6.8431)
  point P11 (6.8431, 19.875)
  point P12 (10, 19.875)
  point P13 (10, 29.875)
  point P14 (-10, 29.875)
  point P15 (-10, 19.875)
  point P16 (-10, -30.125)
  point P17 (-10, -20.125)
  point P18 (10, -30.125)
  point P19 (10, -20.125)
  point P20 (6.8431, -30.125)
  point P21 (-19.875, 6.8431)
  point P22 (-19.875, 10)
  point P23 (-29.875, 10)
  point P24 (-29.875, -10)
  point P25 (-19.875, -10)
  point P26 (30.125, -10)
  point P27 (20.125, -10)
  point P28 (30.125, 10)
  point P29 (20.125, 10)
  point P30 (30.125, 6.8431)
  point P31 (-21, 8.5023)
  point P32 (-24.625, 5.5463)
  point P33 (-25.125, 5.5463)
  point P34 (-25.125, -5.5463)
  point P35 (-24.625, -5.5463)
  point P36 (-21, -8.5023)
  point P37 (-5.5463, 25.125)
  point P38 (5.5463, 25.125)
  dimension "d19" = 20
  dimension "d20" = 10
  dimension "d21" = 45
  dimension "d22" = 1
  dimension "d23" = 1.5
  dimension "d24" = 1
  dimension "d25" = 0.075
  dimension "d28" = 15.1716
  dimension "d29" = 2.8787
  dimension "d30" = 2.8787
  dimension "d31" = 20
  dimension "d32" = 10
  dimension "d33" = 45
  dimension "d34" = 1
  dimension "d35" = 1.5
  dimension "d36" = 1
  dimension "d37" = 0.075
  dimension "d38" = 15.1716
  dimension "d39" = 2.8787
  dimension "d40" = 2.8787
  dimension "d41" = 0.25
  dimension "d42" = 0
  dimension "d45" = 360
extrude "Extrusion2" [suppressed]
extrude "Extrusion3" cut sketch "Sketch2" along normal up to surface (2 mm away) contours A26 A86 L70 | A26 L54 A25 A87 A24 L55 A27 L70 A86 | A88 A24 A87 A25 | A25 L59 A33 A91 A32 L58 A24 A88 | A27 L55 A24 A87 L166 A92 A32 L68 A29 L181 | A88 L167 A91 A32 A92 L166 A87 A24 | A24 L58 A32 A91 L167 A88 | A29 L68 A32 A92 A33 L61 A30 A93 L64 | A33 A92 A32 A91 | A93 A30 L64
fillet "Fillet1" radius 0.25 2 edges at (-24.875, 1, -5.6213) (-24.875, 1, 5.6213)
properties part number "Interlinking Baseplate Pathed Female"
